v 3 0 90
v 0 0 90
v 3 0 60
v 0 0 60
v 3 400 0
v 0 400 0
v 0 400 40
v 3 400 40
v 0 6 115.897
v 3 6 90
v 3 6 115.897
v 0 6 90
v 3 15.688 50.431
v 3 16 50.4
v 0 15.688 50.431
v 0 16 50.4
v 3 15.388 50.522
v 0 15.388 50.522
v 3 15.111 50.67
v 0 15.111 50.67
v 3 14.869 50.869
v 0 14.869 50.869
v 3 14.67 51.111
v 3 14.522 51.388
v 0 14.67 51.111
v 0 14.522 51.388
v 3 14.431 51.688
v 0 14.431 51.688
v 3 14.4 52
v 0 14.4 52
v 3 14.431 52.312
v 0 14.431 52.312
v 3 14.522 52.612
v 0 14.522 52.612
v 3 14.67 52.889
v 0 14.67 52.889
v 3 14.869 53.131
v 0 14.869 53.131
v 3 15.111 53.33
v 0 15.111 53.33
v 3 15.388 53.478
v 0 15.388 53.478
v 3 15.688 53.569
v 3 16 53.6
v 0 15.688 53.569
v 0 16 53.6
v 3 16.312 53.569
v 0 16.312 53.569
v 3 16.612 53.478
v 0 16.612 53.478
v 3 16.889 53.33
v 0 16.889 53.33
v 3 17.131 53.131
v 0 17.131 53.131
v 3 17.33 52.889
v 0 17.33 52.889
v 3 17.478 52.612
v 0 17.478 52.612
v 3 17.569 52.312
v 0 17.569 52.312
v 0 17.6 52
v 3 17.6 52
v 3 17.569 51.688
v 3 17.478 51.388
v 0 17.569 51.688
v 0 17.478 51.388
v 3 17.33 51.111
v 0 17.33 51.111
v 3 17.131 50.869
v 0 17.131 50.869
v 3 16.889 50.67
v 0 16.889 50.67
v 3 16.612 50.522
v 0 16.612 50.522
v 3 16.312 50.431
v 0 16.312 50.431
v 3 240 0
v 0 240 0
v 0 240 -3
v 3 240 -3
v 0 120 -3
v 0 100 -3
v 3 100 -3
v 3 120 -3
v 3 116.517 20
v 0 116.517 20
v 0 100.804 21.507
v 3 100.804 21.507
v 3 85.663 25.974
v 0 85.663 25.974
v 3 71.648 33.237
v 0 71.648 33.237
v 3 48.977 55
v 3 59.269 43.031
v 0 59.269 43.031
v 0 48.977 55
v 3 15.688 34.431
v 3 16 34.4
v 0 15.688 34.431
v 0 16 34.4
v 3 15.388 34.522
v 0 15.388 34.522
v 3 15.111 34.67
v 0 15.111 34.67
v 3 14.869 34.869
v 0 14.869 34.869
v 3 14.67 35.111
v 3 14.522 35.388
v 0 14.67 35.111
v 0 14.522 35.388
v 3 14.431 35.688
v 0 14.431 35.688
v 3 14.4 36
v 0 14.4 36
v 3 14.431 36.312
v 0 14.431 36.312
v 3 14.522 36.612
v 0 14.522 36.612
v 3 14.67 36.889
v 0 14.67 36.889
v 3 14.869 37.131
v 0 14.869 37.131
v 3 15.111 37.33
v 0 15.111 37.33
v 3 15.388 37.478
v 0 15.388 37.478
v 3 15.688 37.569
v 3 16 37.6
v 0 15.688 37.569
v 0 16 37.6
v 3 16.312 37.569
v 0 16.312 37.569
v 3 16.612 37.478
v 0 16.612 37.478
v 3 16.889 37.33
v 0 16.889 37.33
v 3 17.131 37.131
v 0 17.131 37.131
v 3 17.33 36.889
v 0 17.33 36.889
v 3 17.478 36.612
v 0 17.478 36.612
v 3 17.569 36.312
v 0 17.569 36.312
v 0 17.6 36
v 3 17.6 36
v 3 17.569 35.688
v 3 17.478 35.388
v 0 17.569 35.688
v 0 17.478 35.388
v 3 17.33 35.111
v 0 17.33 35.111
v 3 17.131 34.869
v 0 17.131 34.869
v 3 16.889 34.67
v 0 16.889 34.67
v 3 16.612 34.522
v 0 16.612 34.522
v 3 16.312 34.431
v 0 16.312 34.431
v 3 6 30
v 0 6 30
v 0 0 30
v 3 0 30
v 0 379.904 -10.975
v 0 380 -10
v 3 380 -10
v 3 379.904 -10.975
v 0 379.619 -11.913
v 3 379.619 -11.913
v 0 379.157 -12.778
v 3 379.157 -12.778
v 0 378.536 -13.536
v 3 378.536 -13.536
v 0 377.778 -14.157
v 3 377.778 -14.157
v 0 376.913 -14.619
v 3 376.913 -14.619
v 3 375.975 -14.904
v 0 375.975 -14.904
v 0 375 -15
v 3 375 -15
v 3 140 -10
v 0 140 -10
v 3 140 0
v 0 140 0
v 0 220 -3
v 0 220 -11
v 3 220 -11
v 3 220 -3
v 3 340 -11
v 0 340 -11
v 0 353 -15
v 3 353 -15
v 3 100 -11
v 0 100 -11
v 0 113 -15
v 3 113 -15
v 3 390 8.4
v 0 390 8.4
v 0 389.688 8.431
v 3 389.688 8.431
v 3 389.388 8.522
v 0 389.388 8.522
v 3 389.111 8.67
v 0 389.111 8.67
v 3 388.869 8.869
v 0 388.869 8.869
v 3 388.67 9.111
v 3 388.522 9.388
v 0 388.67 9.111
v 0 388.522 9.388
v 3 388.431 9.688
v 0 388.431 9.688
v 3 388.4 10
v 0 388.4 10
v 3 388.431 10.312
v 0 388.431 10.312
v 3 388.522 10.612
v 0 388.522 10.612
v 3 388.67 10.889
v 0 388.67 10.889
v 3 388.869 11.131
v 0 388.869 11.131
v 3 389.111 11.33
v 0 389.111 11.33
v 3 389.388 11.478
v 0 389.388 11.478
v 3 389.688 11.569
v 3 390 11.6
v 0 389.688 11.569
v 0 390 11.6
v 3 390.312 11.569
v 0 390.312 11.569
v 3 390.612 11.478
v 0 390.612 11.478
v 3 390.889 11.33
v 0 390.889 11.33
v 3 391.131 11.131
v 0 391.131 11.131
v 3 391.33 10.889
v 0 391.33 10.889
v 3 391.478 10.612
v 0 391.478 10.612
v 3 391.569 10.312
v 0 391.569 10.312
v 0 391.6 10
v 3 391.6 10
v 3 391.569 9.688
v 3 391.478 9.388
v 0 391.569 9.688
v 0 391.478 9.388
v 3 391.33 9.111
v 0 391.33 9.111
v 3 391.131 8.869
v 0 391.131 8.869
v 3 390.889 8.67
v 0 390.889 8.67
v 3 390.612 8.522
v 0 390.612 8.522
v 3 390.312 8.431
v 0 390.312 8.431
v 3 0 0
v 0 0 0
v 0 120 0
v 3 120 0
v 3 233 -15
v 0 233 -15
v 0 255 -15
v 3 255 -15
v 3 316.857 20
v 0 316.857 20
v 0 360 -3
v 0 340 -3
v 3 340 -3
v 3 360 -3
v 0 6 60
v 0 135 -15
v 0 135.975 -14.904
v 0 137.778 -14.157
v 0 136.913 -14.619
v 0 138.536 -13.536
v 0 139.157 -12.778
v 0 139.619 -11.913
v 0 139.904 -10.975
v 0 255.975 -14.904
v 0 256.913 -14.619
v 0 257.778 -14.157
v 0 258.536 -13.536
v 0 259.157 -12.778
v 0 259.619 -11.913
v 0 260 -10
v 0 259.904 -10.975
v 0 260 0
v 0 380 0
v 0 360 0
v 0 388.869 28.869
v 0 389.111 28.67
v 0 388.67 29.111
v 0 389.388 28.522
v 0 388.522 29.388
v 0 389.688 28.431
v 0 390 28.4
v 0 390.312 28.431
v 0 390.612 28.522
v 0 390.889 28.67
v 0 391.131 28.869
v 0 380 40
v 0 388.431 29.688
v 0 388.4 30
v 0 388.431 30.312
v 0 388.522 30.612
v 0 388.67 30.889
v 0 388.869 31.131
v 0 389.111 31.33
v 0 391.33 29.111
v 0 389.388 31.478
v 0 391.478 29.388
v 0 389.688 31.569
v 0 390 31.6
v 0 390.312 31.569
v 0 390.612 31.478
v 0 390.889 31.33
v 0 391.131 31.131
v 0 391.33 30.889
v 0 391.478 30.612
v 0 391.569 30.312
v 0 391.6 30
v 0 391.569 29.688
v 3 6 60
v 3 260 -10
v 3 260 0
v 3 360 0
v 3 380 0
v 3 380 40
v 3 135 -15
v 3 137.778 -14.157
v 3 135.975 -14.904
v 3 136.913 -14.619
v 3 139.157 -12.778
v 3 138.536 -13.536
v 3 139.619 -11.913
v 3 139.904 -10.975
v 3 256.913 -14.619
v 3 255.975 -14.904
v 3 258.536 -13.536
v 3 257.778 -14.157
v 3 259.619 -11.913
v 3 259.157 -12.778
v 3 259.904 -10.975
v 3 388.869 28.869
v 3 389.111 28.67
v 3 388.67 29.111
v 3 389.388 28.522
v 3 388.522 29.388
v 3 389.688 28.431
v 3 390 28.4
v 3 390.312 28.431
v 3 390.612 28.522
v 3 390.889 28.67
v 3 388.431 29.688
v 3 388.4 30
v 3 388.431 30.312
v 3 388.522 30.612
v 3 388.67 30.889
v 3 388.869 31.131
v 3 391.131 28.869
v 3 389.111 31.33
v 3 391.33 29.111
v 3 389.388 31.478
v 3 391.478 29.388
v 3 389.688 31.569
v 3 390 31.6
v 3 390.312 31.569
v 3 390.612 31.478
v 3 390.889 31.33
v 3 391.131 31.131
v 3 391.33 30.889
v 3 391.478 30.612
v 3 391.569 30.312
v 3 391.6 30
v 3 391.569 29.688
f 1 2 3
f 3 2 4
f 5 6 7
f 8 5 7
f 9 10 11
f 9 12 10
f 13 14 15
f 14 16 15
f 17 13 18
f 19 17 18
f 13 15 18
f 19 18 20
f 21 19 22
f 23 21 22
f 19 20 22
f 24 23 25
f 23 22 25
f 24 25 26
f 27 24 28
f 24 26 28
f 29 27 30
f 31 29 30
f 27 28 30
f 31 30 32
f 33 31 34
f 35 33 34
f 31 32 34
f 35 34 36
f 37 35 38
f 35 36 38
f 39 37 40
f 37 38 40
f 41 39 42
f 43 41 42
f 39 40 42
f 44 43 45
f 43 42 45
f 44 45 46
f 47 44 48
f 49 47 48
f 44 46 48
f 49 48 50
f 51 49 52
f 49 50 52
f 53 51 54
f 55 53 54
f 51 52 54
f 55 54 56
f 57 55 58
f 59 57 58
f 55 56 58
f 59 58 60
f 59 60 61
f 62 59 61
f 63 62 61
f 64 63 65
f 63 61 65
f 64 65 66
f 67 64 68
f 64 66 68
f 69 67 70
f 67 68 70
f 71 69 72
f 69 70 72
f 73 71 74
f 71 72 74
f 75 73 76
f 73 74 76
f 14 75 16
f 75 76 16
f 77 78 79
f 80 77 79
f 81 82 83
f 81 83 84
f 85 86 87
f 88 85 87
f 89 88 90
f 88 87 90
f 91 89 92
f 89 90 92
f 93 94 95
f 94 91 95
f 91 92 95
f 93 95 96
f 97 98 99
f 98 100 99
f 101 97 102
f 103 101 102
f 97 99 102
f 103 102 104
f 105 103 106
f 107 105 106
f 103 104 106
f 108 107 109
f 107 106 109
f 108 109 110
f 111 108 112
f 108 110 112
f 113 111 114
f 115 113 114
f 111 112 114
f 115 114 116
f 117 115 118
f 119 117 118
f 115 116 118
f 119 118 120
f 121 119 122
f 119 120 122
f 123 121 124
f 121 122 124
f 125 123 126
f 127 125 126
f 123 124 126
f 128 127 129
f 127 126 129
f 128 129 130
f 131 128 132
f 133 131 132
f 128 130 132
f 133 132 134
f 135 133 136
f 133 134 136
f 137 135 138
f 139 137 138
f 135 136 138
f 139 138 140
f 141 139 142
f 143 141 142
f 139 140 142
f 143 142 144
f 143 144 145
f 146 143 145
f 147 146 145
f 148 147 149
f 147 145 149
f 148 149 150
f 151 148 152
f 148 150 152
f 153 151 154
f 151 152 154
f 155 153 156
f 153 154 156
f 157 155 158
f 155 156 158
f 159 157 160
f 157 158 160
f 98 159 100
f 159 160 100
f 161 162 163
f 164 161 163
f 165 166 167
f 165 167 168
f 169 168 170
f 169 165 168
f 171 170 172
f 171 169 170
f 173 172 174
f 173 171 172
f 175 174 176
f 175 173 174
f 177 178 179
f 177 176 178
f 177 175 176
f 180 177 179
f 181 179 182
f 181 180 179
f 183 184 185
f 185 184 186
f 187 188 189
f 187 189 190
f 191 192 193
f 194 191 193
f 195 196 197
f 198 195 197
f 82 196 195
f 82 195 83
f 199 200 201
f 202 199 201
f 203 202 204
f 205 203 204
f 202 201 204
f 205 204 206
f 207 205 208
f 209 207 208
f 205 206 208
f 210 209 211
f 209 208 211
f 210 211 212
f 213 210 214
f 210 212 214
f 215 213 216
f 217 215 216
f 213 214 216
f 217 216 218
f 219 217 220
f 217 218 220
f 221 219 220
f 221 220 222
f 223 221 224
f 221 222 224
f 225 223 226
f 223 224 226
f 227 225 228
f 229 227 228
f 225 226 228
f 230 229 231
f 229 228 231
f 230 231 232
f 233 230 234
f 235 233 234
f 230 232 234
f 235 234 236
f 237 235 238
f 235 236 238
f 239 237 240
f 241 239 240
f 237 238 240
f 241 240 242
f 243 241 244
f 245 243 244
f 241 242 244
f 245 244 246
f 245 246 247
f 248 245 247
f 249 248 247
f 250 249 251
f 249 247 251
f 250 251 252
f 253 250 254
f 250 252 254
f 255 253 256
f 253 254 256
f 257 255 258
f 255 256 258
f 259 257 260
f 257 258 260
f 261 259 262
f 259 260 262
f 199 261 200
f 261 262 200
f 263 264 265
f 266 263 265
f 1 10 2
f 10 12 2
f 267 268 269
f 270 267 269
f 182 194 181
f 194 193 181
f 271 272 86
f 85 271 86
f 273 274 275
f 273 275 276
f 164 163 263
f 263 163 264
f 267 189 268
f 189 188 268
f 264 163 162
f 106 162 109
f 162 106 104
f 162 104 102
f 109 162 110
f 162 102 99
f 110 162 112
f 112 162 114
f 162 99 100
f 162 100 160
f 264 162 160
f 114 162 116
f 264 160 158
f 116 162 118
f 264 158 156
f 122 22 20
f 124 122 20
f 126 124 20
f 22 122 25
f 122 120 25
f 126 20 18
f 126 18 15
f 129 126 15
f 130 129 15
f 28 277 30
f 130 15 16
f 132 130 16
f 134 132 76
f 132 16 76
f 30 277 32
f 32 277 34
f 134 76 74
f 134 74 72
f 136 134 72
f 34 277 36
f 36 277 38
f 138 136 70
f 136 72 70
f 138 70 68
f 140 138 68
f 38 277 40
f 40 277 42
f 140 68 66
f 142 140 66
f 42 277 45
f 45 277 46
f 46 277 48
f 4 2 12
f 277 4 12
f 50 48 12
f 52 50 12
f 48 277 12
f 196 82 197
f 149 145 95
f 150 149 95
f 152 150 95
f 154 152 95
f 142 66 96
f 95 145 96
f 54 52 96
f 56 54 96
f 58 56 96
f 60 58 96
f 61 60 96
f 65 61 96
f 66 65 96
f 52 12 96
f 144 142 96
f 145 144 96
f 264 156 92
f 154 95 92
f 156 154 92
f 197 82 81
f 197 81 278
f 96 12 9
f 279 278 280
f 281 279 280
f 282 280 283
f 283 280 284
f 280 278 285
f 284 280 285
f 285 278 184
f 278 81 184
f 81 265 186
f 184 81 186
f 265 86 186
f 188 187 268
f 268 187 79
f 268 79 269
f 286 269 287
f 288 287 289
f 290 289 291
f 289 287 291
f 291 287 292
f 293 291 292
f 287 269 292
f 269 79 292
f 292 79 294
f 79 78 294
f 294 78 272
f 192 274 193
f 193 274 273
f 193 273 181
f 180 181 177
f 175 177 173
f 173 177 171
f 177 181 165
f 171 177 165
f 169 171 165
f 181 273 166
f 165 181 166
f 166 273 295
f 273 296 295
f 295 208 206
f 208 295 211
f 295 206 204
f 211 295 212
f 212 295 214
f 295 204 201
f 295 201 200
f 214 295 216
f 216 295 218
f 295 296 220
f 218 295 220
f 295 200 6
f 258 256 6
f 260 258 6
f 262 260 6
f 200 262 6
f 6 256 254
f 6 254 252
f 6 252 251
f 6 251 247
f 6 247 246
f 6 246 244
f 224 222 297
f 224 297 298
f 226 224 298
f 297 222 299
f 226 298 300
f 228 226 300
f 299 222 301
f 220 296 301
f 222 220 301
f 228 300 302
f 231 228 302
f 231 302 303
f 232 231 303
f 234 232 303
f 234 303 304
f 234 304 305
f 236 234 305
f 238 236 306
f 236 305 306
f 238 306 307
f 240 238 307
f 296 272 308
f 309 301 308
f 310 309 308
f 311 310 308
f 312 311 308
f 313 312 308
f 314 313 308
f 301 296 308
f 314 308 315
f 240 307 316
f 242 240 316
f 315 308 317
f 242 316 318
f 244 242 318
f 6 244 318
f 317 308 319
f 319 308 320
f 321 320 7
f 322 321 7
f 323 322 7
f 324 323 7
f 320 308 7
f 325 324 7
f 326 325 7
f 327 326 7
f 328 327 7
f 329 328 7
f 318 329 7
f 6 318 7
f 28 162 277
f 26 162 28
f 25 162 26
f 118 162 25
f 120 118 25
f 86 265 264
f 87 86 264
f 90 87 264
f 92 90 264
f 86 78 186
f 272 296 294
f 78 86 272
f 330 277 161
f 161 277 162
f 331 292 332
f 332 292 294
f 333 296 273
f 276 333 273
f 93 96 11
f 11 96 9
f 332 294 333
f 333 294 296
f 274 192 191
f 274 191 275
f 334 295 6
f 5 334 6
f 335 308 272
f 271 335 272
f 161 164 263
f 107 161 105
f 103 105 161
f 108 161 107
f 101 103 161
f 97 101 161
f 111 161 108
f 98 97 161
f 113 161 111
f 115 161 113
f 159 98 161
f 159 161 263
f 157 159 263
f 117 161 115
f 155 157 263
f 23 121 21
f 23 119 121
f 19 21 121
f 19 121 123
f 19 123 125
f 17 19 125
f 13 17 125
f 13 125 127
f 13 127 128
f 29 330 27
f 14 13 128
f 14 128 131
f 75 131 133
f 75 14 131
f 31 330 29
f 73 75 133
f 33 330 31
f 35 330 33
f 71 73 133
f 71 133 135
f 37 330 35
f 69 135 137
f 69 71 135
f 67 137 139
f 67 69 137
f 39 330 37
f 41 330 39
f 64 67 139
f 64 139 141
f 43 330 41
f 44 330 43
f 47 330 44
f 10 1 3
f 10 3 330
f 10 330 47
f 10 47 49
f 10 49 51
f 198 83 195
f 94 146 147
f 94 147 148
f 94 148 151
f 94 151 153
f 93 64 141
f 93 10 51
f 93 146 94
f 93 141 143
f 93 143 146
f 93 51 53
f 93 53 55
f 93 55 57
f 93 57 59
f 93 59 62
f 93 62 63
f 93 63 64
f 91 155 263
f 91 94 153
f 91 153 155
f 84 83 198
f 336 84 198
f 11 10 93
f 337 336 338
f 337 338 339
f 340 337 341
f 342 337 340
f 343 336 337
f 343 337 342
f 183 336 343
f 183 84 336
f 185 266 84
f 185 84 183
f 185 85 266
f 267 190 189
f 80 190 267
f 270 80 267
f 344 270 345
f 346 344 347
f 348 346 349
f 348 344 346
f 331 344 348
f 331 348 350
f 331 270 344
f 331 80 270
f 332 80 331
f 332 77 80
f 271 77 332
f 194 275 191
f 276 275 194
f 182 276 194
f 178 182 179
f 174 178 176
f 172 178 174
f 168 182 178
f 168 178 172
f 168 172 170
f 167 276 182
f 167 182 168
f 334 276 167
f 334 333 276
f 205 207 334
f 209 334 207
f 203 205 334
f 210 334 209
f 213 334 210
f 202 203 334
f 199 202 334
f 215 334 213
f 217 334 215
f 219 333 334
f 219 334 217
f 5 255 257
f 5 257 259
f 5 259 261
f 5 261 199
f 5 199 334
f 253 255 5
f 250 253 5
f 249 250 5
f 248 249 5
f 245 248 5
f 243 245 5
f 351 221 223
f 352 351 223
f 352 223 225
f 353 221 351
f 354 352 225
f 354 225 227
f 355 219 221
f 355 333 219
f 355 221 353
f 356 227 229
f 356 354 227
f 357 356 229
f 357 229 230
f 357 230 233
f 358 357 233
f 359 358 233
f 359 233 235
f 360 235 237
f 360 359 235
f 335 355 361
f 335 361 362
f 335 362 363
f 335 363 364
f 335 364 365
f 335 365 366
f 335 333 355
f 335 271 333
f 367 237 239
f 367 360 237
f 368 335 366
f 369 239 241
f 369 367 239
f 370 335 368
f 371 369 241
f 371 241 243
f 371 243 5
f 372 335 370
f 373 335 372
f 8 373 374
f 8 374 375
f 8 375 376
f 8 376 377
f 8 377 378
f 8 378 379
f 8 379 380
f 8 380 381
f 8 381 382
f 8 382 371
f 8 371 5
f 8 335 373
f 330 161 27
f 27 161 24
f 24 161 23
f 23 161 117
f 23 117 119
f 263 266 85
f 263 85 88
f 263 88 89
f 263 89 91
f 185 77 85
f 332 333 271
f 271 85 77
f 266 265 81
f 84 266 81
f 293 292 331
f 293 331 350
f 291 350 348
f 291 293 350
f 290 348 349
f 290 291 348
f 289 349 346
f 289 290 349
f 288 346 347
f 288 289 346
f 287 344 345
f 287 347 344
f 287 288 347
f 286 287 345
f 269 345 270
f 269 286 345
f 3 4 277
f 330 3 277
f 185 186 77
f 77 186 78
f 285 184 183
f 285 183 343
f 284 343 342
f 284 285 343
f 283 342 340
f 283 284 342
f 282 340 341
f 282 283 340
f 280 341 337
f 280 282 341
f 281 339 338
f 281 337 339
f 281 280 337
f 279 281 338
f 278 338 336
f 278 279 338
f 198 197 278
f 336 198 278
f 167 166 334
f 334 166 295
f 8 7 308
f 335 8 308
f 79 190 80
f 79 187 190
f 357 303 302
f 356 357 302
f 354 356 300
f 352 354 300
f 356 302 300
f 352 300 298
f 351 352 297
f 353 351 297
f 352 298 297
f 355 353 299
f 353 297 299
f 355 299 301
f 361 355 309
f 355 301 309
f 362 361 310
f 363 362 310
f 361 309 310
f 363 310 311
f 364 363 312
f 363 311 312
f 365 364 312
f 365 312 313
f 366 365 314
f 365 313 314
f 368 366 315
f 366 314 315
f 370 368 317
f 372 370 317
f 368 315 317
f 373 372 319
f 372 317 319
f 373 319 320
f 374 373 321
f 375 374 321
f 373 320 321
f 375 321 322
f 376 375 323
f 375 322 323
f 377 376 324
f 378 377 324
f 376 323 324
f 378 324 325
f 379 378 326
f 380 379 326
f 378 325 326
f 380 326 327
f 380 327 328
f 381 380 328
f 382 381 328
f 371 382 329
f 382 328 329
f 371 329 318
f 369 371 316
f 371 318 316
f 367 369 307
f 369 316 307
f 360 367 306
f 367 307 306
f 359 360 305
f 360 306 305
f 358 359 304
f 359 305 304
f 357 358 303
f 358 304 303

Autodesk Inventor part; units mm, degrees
ref_plane "YZ Plane" through (0, 0, 0) normal (1, 0, 0) x (0, 1, 0)
ref_plane "XZ Plane" through (0, 0, 0) normal (0, 1, 0) x (-1, 0, 0)
ref_plane "XY Plane" through (0, 0, 0) normal (0, 0, 1) x (1, 0, 0)
sketch "Sketch1" plane through (0, 0, 0) normal (1, 0, 0) x (0, 1, 0)
  line L0 (0, 90) -> (0, 60)
  line L1 (400, 0) -> (400, 40)
  line L2 (6, 90) -> (0, 90)
  line L3 (360, 0) -> (360, -3)
  line L4 (353, -15) -> (375, -15)
  line L5 (380, -10) -> (380, 0)
  line L6 (353, -15) -> (340, -15) construction
  line L7 (340, -15) -> (340, -11) construction
  line L8 (340, -3) -> (360, -3)
  line L9 (0, 0) -> (360, 0)
  line L10 (380, 0) -> (400, 0)
  line L11 (340, -11) -> (353, -15)
  arc A0 (375, -15) -> (380, -10) centre (375, -10) ccw
  line L12 (340, -11) -> (340, -3)
  line L13 (240, 0) -> (240, -3)
  line L14 (220, -3) -> (240, -3)
  line L15 (220, -11) -> (220, -3)
  line L16 (260, -10) -> (260, 0)
  line L17 (233, -15) -> (255, -15)
  line L18 (233, -15) -> (220, -15) construction
  line L19 (220, -15) -> (220, -11) construction
  line L20 (220, -11) -> (233, -15)
  arc A1 (255, -15) -> (260, -10) centre (255, -10) ccw
  line L21 (120, 0) -> (120, -3)
  line L22 (100, -3) -> (120, -3)
  line L23 (100, -11) -> (100, -3)
  line L24 (140, -10) -> (140, 0)
  line L25 (113, -15) -> (135, -15)
  line L26 (113, -15) -> (100, -15) construction
  line L27 (100, -15) -> (100, -11) construction
  line L28 (100, -11) -> (113, -15)
  arc A2 (135, -15) -> (140, -10) centre (135, -10) ccw
  line L29 (240, 0) -> (260, 0)
  line L30 (120, 0) -> (140, 0)
  line L31 (6, 90) -> (6, 60) construction
  line L32 (0, 60) -> (6, 60)
  line L33 (6, 30) -> (0, 30)
  line L34 (0, 60) -> (0, 30) construction
  line L35 (0, 30) -> (0, 0)
  line L36 (6, 30) -> (6, 0) construction
  line L37 (6, 60) -> (6, 30)
  line L38 (400, 40) -> (380, 40)
  line L39 (380, 40) -> (316.8572, 20)
  line L40 (316.8572, 20) -> (116.5169, 20)
  line L41 (48.9774, 55) -> (6, 115.8967)
  arc A3 (48.9774, 55) -> (116.5169, 20) centre (116.5169, 102.6656) ccw
  line L42 (6, 90) -> (6, 115.8967)
  point P0 (24.2764, 90)
  dimension "d0" = 400
  dimension "d2" = 40
  dimension "d3" = 90
  dimension "d7" = 3
  dimension "d8" = 20
  dimension "d9" = 20
  dimension "d10" = 12
  dimension "d11" = 5
  dimension "d14" = 120
  dimension "d19" = 8
  dimension "d20" = 22
  dimension "d21" = 20
  dimension "d22" = 6
  dimension "d23" = 30
  dimension "d24" = 30
extrude "Extrusion1" add sketch "Sketch1" along normal blind 3
sketch "Sketch2" plane through (3, 0, 0) normal (1, 0, 0) x (0, 0, -1)
  line L0 (-52, 16) -> (-36, 16) construction
  line L1 (-30, 0) -> (0, 0) projected
  line L2 (-30, 390) -> (-10, 390) construction
  line L3 (0, 400) -> (-40, 400) projected
  line L4 (0, 380) -> (0, 400) projected
  line L5 (0, 0) -> (0, 120) projected
  dimension "d25" = 16
  dimension "d26" = 16
  dimension "d27" = 20
  dimension "d28" = 10
  dimension "d29" = 10
  dimension "d30" = 36
hole "Hole1" at (3, 16, 52) at (3, 16, 36) at (3, 390, 30) at (3, 390, 10) direction (-1, 0, 0) diameter 3.2 end through all
properties part number "Camera mounting side"
